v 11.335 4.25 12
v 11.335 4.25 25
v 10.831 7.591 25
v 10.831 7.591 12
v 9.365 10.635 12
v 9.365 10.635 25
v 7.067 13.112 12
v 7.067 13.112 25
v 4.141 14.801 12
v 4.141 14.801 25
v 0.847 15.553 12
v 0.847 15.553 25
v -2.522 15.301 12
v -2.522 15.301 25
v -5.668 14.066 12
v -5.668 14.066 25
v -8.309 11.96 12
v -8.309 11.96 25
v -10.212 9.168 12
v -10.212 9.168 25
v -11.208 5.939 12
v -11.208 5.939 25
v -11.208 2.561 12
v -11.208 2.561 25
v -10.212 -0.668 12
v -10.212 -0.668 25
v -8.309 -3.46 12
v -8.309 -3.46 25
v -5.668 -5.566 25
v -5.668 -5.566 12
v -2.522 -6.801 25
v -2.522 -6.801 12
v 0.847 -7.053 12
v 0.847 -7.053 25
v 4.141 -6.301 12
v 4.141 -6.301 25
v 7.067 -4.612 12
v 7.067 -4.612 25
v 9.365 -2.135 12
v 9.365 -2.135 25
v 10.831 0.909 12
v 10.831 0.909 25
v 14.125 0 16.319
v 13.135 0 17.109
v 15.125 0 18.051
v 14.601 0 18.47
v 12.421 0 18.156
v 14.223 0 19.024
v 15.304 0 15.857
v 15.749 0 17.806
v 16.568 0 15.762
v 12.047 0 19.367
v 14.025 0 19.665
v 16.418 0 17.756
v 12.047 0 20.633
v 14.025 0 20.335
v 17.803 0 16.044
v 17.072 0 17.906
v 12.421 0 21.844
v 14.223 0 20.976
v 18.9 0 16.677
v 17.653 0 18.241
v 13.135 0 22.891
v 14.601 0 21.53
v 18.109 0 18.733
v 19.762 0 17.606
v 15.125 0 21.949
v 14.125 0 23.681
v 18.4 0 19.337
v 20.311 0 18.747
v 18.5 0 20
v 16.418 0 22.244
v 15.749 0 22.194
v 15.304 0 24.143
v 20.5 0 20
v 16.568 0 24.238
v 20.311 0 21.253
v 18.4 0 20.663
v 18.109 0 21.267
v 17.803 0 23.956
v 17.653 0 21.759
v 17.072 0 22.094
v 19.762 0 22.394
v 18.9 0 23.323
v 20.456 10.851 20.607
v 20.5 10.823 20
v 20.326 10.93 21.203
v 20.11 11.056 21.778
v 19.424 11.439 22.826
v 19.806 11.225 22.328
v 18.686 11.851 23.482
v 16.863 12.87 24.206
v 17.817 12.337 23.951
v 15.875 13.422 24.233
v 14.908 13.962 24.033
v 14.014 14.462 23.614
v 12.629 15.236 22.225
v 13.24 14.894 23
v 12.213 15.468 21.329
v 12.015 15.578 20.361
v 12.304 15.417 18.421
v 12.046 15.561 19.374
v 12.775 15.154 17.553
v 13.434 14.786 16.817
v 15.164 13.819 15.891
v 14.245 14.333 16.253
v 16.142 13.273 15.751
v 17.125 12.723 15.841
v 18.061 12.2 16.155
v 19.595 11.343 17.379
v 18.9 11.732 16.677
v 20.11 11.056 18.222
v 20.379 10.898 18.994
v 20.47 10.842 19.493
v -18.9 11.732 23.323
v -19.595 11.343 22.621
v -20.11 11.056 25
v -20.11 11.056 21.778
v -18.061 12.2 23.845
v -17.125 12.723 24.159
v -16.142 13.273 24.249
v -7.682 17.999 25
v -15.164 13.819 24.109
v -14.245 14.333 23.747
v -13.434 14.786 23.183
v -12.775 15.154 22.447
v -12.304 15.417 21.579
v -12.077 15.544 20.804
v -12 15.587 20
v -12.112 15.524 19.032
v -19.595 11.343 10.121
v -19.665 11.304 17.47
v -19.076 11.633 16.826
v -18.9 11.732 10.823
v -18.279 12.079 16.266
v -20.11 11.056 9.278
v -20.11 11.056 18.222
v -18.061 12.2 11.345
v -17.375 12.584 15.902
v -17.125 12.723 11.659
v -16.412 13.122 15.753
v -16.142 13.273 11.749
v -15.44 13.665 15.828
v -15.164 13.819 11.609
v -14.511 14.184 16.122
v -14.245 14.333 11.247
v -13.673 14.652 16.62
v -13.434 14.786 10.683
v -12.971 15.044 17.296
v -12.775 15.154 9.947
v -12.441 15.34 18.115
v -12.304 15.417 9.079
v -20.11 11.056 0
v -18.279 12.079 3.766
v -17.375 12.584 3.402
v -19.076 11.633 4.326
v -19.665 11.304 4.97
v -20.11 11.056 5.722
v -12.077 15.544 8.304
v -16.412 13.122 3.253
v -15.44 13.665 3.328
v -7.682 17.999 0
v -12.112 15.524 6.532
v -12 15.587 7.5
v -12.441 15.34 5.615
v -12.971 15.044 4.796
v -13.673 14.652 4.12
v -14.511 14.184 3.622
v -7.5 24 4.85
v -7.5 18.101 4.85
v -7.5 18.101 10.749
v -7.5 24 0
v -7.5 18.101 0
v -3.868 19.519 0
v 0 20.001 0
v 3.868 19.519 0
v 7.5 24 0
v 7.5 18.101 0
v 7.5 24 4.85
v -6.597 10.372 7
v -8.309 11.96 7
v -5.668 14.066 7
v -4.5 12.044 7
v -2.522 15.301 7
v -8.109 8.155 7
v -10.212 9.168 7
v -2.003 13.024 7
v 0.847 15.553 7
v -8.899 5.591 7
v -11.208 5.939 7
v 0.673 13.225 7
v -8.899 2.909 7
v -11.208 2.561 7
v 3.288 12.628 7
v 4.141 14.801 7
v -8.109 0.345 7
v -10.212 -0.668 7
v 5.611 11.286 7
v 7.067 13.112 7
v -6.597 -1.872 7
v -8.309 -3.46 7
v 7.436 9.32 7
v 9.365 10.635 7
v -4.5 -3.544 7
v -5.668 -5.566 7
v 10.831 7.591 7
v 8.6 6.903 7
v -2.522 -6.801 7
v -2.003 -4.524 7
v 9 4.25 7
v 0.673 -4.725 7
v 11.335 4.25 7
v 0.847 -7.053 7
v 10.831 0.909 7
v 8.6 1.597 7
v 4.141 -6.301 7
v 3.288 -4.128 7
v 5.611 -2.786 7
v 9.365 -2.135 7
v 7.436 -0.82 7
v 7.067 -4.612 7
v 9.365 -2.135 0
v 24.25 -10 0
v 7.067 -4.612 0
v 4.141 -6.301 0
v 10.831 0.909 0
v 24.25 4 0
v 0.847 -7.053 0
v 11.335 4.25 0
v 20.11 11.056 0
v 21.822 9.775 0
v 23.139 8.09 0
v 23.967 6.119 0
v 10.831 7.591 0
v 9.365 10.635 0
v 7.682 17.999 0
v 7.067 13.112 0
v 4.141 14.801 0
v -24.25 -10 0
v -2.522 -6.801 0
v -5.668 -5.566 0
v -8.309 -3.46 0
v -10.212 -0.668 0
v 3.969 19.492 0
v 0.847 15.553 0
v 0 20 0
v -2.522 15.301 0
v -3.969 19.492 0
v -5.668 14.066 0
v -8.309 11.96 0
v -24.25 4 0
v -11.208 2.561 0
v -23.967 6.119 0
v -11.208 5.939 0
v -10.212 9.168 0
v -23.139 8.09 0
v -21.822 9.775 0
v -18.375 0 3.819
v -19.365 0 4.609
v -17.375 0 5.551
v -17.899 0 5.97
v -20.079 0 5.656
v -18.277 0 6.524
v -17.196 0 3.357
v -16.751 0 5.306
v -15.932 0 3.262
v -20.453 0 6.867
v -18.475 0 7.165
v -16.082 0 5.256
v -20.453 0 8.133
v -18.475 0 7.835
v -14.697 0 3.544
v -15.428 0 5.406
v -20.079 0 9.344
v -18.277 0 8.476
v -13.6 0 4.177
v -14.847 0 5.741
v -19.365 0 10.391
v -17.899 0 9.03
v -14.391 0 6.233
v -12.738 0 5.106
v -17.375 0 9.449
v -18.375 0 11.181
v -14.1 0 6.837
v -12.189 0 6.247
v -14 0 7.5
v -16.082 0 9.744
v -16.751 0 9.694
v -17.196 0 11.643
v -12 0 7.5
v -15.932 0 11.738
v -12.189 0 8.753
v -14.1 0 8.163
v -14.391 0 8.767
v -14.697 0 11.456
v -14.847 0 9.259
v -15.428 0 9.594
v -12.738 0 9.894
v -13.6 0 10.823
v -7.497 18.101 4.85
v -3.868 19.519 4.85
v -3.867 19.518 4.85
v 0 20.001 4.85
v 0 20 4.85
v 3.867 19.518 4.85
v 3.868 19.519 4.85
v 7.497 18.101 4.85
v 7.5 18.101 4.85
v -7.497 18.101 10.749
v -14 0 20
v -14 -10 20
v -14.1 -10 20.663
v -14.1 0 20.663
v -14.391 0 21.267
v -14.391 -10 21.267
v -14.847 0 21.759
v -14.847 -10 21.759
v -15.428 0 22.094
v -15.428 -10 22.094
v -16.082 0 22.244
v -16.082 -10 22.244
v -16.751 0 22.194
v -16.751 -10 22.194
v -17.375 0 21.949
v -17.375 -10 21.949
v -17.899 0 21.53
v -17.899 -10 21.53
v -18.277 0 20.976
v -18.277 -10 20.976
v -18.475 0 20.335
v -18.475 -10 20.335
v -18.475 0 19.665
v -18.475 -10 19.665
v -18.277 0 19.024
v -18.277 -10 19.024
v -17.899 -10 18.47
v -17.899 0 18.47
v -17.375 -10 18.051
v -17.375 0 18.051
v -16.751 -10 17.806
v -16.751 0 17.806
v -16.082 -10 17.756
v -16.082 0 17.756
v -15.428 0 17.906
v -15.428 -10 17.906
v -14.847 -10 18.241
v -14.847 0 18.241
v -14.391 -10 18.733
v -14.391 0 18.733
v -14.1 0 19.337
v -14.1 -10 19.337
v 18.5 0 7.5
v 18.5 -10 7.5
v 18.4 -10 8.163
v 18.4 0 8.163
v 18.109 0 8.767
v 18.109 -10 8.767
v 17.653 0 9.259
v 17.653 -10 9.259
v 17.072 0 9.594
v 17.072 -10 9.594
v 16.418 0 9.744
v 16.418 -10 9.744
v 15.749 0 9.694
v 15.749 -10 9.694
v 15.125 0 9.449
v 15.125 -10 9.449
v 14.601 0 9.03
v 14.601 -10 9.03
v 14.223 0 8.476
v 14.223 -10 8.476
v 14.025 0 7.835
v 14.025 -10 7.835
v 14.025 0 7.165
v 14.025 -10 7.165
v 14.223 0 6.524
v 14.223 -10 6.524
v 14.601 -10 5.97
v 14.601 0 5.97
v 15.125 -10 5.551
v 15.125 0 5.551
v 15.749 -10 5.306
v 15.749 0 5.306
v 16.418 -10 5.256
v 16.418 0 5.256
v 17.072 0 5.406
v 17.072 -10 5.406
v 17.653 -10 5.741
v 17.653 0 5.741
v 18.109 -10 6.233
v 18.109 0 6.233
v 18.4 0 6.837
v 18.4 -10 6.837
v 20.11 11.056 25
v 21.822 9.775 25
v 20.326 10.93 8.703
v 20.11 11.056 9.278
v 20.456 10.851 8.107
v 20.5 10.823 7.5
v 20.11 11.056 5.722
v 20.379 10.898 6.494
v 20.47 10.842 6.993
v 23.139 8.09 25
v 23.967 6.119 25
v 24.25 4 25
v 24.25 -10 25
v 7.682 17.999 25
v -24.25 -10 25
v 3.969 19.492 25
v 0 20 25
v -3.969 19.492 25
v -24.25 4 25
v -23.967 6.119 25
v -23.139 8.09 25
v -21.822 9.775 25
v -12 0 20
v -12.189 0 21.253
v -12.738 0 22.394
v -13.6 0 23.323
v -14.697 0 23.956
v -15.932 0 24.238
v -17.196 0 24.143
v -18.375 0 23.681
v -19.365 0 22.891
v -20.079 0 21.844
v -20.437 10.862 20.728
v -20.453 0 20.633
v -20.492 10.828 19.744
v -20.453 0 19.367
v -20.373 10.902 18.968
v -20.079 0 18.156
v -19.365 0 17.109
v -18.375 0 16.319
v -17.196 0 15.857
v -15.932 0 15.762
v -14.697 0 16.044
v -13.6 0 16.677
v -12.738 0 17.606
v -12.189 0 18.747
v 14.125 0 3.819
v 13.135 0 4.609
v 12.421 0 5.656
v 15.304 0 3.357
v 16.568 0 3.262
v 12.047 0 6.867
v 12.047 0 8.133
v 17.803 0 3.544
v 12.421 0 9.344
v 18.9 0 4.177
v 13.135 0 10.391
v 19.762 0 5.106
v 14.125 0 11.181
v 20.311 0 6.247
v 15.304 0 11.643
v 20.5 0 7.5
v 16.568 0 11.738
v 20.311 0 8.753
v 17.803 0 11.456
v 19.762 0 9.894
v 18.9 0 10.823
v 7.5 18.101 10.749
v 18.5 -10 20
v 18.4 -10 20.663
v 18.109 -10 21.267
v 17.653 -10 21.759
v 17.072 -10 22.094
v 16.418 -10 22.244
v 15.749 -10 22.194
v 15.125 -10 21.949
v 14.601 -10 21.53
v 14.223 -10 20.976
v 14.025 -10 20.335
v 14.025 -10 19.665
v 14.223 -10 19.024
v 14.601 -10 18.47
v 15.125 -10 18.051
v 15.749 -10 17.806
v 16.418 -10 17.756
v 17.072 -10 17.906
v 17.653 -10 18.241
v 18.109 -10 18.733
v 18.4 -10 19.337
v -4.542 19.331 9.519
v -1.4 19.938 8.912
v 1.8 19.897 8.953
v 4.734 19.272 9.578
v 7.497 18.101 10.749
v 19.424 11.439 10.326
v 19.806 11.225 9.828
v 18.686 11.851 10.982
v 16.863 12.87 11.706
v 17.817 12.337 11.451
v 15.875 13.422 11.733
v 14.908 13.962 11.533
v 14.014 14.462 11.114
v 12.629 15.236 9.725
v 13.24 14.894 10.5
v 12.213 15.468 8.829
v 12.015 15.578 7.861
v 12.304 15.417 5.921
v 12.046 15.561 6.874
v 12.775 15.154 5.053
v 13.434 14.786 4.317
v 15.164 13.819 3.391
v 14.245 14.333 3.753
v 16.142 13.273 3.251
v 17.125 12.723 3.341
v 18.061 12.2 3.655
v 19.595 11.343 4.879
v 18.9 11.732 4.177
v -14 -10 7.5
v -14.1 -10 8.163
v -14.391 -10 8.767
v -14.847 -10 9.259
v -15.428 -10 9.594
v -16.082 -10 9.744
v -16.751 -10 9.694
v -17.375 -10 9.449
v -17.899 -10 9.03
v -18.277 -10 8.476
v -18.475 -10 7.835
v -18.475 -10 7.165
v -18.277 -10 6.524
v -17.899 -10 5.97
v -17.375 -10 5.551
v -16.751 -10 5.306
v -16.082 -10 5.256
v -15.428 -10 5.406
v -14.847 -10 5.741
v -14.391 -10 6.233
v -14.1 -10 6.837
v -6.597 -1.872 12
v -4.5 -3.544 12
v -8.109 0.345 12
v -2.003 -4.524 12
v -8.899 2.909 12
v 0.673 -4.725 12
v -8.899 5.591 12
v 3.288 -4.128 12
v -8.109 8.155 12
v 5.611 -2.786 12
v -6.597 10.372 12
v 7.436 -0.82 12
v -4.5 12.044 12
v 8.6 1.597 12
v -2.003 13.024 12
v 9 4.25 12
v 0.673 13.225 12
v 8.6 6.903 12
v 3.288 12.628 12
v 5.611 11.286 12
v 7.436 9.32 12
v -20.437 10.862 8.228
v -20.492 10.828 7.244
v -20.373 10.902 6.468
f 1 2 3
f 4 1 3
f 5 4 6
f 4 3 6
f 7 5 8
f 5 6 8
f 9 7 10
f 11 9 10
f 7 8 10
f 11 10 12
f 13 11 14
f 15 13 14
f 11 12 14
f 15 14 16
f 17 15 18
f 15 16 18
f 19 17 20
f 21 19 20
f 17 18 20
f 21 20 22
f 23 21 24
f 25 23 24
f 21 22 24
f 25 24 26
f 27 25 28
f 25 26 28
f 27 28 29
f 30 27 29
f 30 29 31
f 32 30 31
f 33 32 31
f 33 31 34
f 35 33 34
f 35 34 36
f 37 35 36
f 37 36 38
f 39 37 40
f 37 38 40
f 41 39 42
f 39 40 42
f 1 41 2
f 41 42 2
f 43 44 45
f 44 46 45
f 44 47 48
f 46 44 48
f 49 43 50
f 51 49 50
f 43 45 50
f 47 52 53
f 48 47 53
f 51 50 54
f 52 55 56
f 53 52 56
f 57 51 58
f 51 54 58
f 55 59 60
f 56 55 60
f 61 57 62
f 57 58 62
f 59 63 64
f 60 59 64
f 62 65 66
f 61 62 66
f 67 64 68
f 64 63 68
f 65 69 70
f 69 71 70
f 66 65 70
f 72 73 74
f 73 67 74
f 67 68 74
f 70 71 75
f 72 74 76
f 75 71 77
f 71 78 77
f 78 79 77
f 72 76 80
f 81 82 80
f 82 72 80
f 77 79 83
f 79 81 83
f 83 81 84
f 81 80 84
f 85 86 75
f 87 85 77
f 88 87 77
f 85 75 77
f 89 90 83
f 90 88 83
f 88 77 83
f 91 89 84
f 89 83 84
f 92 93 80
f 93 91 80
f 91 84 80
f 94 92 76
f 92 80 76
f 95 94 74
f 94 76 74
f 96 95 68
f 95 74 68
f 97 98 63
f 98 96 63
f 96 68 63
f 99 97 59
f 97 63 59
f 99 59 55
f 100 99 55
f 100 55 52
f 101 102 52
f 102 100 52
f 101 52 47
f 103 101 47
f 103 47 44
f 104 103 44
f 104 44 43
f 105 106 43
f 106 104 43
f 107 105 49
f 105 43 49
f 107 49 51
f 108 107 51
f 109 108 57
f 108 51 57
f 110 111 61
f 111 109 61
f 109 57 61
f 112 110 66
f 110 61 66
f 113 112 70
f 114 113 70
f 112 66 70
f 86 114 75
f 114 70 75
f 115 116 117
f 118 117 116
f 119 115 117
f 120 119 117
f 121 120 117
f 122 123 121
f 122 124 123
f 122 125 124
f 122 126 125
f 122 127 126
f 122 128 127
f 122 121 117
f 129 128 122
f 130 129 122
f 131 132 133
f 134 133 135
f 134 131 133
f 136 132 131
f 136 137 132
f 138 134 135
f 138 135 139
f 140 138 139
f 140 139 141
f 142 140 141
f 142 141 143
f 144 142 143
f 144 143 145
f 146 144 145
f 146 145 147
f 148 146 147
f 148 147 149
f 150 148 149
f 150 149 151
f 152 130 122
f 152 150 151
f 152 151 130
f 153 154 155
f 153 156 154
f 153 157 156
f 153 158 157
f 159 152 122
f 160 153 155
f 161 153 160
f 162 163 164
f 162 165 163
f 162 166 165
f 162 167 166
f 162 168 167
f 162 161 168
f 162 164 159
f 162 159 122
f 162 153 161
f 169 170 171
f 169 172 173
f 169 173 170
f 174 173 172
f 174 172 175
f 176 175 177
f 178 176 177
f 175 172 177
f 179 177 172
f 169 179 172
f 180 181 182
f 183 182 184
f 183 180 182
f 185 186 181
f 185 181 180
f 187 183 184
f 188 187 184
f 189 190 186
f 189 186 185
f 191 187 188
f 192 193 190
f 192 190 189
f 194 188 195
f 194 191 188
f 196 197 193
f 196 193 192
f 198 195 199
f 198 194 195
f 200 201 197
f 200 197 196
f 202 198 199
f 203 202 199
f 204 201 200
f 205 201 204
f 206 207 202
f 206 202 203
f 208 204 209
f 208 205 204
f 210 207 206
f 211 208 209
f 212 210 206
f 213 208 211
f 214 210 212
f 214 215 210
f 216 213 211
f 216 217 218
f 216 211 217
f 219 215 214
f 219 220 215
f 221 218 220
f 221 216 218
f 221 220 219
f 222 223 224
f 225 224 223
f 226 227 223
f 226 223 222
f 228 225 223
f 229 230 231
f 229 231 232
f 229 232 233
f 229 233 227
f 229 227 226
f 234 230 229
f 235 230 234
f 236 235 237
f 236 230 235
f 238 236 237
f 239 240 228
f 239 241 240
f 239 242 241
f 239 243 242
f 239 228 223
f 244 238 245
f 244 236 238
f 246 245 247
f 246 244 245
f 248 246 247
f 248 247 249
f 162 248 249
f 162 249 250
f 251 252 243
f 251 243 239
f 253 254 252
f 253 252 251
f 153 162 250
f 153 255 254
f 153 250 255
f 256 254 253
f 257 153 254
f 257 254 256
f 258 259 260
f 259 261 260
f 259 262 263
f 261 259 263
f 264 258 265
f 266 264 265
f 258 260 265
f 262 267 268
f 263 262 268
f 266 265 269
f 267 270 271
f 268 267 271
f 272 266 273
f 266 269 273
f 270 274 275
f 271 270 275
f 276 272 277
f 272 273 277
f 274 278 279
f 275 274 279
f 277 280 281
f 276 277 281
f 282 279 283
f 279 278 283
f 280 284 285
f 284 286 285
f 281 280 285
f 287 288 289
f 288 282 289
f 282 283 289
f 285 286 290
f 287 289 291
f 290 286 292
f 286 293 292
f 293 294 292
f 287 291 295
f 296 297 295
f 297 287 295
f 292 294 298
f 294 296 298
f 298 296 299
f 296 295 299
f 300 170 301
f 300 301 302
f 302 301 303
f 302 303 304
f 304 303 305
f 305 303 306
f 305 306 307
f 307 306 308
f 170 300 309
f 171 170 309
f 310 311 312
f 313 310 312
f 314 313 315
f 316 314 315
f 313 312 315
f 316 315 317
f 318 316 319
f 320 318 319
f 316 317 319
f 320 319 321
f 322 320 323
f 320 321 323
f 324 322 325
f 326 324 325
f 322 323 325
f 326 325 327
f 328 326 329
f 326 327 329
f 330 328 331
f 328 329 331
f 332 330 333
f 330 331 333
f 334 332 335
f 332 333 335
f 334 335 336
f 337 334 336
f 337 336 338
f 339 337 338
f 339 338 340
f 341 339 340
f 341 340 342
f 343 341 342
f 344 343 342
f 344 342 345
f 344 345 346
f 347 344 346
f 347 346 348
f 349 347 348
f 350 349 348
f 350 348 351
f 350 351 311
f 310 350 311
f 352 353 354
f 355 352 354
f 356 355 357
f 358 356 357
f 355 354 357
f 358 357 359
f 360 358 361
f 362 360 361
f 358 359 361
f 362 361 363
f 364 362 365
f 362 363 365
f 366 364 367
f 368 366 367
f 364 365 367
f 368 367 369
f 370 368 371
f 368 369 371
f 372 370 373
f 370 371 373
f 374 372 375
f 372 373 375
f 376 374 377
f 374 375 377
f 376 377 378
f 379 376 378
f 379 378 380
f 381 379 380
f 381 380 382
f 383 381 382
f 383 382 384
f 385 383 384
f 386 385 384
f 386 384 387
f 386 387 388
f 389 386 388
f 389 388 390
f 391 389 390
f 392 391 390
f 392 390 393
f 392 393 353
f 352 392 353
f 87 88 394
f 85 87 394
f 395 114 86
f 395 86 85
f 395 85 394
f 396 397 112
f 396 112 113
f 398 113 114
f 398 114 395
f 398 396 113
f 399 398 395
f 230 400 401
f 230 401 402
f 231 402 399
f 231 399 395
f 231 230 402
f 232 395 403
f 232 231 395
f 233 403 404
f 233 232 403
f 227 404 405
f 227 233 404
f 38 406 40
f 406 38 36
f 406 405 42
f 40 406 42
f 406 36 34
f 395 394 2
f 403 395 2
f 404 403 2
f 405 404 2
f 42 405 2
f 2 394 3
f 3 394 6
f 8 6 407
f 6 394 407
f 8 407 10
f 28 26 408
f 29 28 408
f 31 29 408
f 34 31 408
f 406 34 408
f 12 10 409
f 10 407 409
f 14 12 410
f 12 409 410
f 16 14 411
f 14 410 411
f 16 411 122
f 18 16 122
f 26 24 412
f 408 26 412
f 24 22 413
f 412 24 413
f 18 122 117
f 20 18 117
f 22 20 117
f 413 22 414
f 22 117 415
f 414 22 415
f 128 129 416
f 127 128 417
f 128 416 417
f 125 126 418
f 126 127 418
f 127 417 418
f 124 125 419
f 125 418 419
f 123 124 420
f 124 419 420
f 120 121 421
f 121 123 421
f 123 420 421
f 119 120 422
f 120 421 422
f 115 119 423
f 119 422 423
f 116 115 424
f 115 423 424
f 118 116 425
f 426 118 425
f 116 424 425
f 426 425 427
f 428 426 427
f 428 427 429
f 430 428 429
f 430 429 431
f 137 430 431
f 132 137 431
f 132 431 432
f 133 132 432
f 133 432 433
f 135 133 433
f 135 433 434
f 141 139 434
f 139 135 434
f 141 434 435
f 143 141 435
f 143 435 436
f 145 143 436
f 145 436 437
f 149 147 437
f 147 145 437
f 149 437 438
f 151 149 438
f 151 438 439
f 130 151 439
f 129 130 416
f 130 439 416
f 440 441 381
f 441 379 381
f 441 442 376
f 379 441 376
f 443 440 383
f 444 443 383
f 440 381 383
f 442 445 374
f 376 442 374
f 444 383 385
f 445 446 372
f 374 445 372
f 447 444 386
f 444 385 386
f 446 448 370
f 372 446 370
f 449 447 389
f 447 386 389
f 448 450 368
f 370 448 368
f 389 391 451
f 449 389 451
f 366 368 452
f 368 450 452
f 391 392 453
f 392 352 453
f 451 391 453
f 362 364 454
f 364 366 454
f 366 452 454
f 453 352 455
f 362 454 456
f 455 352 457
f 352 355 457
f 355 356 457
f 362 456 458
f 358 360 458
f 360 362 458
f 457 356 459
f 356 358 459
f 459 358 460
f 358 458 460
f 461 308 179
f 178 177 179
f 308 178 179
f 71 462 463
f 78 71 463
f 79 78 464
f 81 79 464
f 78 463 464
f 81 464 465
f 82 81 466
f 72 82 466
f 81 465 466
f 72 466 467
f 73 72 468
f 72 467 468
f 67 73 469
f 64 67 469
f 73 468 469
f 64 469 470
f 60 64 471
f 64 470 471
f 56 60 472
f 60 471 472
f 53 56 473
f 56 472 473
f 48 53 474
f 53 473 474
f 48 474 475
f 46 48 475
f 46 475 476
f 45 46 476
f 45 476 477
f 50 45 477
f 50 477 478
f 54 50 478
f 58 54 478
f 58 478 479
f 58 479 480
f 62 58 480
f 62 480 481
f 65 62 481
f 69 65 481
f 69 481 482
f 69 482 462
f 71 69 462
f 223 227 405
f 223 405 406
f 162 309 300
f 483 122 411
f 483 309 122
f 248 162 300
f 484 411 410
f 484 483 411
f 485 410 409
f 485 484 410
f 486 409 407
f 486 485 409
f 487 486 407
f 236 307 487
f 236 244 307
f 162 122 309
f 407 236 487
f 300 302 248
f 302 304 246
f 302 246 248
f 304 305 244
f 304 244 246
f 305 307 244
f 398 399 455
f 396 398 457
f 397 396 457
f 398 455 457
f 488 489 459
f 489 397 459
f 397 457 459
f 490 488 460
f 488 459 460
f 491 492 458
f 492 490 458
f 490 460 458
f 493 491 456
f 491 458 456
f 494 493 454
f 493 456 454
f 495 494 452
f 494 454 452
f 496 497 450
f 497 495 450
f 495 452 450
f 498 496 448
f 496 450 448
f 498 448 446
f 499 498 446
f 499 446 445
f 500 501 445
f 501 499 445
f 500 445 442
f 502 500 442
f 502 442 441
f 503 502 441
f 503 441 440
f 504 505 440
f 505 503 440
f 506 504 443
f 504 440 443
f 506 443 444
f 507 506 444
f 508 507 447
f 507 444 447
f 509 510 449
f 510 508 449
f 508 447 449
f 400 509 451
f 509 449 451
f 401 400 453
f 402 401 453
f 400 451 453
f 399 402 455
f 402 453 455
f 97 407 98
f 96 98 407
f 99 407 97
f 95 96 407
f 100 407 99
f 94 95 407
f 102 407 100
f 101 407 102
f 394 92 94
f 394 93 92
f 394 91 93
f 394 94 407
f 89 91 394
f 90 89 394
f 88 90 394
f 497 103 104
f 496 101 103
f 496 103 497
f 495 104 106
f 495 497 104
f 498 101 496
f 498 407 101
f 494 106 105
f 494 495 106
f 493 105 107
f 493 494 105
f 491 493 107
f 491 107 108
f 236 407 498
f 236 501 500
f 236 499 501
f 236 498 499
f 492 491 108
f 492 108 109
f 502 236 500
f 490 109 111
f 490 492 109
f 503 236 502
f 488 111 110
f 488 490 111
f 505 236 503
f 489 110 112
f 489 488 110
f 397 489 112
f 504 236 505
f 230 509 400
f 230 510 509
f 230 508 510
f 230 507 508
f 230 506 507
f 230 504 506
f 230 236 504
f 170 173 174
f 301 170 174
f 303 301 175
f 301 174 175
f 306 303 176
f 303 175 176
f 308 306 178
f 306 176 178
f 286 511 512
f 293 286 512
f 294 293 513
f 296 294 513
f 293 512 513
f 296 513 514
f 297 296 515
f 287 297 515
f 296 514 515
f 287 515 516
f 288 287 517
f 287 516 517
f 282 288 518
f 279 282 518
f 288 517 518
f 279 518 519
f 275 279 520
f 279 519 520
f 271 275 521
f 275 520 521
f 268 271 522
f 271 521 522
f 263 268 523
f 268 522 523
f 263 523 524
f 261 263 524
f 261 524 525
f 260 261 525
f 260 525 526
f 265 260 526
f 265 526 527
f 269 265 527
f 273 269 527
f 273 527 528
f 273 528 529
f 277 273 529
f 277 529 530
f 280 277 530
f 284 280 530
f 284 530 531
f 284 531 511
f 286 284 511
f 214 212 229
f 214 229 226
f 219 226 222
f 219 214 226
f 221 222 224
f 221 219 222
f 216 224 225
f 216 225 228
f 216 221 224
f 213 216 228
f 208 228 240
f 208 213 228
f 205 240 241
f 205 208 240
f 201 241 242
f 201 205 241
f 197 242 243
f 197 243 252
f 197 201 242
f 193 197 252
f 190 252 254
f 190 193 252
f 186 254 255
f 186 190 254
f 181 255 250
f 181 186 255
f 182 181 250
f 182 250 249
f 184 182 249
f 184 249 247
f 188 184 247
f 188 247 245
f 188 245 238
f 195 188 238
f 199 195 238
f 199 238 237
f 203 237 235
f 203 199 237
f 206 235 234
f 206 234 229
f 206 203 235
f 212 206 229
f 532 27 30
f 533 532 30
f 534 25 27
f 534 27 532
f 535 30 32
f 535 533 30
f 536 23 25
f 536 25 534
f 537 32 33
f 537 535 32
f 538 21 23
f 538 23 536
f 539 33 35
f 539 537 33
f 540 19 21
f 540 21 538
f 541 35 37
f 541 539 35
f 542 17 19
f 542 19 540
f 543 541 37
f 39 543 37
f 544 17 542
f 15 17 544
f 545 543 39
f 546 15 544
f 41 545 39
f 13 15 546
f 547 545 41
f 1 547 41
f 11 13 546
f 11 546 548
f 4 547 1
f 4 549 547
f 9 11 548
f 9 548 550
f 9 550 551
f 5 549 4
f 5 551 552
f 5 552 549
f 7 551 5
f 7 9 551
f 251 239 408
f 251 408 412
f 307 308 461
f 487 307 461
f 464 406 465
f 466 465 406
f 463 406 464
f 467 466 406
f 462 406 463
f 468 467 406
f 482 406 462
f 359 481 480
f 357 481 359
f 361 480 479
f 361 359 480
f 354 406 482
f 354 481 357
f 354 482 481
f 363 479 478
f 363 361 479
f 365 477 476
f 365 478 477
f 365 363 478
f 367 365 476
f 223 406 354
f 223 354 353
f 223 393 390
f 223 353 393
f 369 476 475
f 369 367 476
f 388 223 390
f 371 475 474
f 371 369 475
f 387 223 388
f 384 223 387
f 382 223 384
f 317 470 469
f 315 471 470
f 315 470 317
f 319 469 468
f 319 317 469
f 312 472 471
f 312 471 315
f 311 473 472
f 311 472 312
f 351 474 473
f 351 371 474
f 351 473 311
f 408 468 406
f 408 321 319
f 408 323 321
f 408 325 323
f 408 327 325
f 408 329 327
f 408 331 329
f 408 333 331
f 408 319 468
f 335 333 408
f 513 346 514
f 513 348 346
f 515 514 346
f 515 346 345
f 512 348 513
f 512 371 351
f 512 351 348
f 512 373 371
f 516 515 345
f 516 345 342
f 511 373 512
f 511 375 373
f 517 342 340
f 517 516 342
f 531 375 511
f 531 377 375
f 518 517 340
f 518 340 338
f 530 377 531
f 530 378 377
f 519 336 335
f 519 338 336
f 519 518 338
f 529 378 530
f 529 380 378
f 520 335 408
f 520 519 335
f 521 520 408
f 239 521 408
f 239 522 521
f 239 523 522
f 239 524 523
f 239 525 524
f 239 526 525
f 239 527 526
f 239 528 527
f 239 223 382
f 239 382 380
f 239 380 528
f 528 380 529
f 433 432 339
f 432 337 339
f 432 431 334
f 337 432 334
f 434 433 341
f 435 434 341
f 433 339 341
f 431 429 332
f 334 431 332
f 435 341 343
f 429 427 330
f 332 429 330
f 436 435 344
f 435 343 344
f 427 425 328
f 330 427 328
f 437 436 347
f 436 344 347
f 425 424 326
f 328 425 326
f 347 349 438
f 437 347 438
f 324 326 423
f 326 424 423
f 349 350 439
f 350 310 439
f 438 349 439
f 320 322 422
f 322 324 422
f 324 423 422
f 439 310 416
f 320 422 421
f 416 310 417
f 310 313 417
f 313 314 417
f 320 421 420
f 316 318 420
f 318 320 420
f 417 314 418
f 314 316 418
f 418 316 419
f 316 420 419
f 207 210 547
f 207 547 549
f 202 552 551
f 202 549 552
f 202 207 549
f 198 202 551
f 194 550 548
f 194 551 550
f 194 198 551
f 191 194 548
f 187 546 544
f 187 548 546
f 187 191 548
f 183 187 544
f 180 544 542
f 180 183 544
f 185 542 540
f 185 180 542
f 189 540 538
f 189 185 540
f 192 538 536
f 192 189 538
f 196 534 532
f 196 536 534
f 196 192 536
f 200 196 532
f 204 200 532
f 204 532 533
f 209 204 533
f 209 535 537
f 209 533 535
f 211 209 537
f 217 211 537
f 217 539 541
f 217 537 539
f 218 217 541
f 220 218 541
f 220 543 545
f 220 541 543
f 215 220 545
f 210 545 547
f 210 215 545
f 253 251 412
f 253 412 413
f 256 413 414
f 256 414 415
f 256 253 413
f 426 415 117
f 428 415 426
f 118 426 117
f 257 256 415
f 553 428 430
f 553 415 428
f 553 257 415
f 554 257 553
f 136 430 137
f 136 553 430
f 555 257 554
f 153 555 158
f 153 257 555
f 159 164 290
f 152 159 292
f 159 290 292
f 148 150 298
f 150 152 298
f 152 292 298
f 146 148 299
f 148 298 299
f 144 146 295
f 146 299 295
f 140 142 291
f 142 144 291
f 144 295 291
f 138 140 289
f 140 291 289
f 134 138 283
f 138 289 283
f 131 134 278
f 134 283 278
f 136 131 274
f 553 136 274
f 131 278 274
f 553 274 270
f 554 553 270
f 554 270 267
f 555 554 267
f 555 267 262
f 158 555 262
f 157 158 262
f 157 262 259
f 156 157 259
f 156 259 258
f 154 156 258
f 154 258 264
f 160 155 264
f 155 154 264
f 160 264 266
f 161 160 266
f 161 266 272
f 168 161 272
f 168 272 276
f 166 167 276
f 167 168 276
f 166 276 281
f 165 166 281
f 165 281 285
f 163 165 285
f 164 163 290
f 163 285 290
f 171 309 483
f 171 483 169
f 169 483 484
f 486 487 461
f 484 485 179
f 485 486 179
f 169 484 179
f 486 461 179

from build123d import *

# Parameters (mm, degrees)
SKETCH1_R           = 9
BOSS_EXTRUDE1_DEPTH = 25
SKETCH2_R           = 11.335
CUT_EXTRUDE1_DEPTH  = 13
CUT_EXTRUDE2_START  = -7
SKETCH3_R           = 11.335
CUT_EXTRUDE2_DEPTH  = 7
BOSS_EXTRUDE2_DEPTH = 4.85
BOSS_EXTRUDE3_DEPTH = 15
SKETCH6_R           = 2.25
CUT_EXTRUDE3_DEPTH  = 49.673016138
SKETCH7_R           = 4.25
CUT_EXTRUDE4_DEPTH  = 43.297310789


with BuildPart() as part:
    # Sketch1 → Boss-Extrude1 (new body)
    with BuildSketch(Plane.XY):
        with BuildLine():
            Line((24.25, 4), (24.25, -10))
            Line((24.25, -10), (-24.25, -10))
            Line((-24.25, -10), (-24.25, 4))
            ThreePointArc((-24.25, 4), (-23.13858198, 8.090248735), (-20.11, 11.055560845))
            Line((-20.11, 11.055560845), (-7.682261614, 17.999376585))
            ThreePointArc((-7.682261614, 17.999376585), (0, 20), (7.682261614, 17.999376585))
            Line((7.682261614, 17.999376585), (20.11, 11.055560845))
            ThreePointArc((20.11, 11.055560845), (23.13858198, 8.090248735), (24.25, 4))
        make_face()
        with Locations((0, 4.25)):
            Circle(SKETCH1_R, mode=Mode.SUBTRACT)
    extrude(amount=BOSS_EXTRUDE1_DEPTH)

    # Sketch2 → Cut-Extrude1 (cut)
    with BuildSketch(Plane.XY.offset(25)):
        with Locations((0, 4.25)):
            Circle(SKETCH2_R)
    extrude(amount=-CUT_EXTRUDE1_DEPTH, mode=Mode.SUBTRACT)

    # Sketch3 → Cut-Extrude2 (cut)
    with BuildSketch(Plane(origin=(0, 0, 0), x_dir=(-1, 0, 0), z_dir=(0, 0, -1)).offset(CUT_EXTRUDE2_START)):
        with Locations(Location((0, 4.25, 0), (0, 0, 180))):
            Circle(SKETCH3_R)
    extrude(amount=CUT_EXTRUDE2_DEPTH, mode=Mode.SUBTRACT)



with BuildPart() as body_2:
    # Sketch4 → Boss-Extrude2 (new body)
    with BuildSketch(Plane(origin=(0, 0, 0), x_dir=(-1, 0, 0), z_dir=(0, 0, -1))):
        with BuildLine():
            Line((-7.5, 18.101212577), (-7.5, 24))
            Line((-7.5, 24), (7.5, 24))
            Line((7.5, 24), (7.5, 18.101212577))
            ThreePointArc((7.5, 18.101212577), (0, 20.001383744), (-7.5, 18.101212577))
        make_face()
    extrude(amount=-BOSS_EXTRUDE2_DEPTH)


with BuildPart() as part_1:
    add(part.part)

    add(body_2.part)  # Boss-Extrude3 merges body 2
    # Sketch5 → Boss-Extrude3 (add)
    with BuildSketch(Plane(origin=(7.5, 0, 0), x_dir=(0, 0, -1), z_dir=(1, 0, 0))):
        Polygon((-4.85, 24), (-4.85, 18.101212577), (-10.748787423, 18.101212577), align=None)
    extrude(amount=-BOSS_EXTRUDE3_DEPTH)

    # Sketch6 → Cut-Extrude3 (cut, through all)
    with BuildSketch(Plane.XZ.offset(10)):
        with Locations((-16.25, 20)):
            Circle(SKETCH6_R)
        with Locations((16.25, 20)):
            Circle(SKETCH6_R)
        with Locations((16.25, 7.5)):
            Circle(SKETCH6_R)
        with Locations((-16.25, 7.5)):
            Circle(SKETCH6_R)
    extrude(amount=-CUT_EXTRUDE3_DEPTH, mode=Mode.SUBTRACT)

    # Sketch7 → Cut-Extrude4 (cut, through all)
    with BuildSketch(Plane(origin=(0, 0, 0), x_dir=(-1, 0, 0), z_dir=(0, -1, 0))):
        with Locations(Location((16.25, -20, 0), (0, 0, 180))):
            Circle(SKETCH7_R)
        with Locations(Location((16.25, -7.5, 0), (0, 0, 180))):
            Circle(SKETCH7_R)
        with Locations(Location((-16.25, -7.5, 0), (0, 0, 180))):
            Circle(SKETCH7_R)
        with Locations(Location((-16.25, -20, 0), (0, 0, 180))):
            Circle(SKETCH7_R)
    extrude(amount=-CUT_EXTRUDE4_DEPTH, mode=Mode.SUBTRACT)


solid = part_1.part
